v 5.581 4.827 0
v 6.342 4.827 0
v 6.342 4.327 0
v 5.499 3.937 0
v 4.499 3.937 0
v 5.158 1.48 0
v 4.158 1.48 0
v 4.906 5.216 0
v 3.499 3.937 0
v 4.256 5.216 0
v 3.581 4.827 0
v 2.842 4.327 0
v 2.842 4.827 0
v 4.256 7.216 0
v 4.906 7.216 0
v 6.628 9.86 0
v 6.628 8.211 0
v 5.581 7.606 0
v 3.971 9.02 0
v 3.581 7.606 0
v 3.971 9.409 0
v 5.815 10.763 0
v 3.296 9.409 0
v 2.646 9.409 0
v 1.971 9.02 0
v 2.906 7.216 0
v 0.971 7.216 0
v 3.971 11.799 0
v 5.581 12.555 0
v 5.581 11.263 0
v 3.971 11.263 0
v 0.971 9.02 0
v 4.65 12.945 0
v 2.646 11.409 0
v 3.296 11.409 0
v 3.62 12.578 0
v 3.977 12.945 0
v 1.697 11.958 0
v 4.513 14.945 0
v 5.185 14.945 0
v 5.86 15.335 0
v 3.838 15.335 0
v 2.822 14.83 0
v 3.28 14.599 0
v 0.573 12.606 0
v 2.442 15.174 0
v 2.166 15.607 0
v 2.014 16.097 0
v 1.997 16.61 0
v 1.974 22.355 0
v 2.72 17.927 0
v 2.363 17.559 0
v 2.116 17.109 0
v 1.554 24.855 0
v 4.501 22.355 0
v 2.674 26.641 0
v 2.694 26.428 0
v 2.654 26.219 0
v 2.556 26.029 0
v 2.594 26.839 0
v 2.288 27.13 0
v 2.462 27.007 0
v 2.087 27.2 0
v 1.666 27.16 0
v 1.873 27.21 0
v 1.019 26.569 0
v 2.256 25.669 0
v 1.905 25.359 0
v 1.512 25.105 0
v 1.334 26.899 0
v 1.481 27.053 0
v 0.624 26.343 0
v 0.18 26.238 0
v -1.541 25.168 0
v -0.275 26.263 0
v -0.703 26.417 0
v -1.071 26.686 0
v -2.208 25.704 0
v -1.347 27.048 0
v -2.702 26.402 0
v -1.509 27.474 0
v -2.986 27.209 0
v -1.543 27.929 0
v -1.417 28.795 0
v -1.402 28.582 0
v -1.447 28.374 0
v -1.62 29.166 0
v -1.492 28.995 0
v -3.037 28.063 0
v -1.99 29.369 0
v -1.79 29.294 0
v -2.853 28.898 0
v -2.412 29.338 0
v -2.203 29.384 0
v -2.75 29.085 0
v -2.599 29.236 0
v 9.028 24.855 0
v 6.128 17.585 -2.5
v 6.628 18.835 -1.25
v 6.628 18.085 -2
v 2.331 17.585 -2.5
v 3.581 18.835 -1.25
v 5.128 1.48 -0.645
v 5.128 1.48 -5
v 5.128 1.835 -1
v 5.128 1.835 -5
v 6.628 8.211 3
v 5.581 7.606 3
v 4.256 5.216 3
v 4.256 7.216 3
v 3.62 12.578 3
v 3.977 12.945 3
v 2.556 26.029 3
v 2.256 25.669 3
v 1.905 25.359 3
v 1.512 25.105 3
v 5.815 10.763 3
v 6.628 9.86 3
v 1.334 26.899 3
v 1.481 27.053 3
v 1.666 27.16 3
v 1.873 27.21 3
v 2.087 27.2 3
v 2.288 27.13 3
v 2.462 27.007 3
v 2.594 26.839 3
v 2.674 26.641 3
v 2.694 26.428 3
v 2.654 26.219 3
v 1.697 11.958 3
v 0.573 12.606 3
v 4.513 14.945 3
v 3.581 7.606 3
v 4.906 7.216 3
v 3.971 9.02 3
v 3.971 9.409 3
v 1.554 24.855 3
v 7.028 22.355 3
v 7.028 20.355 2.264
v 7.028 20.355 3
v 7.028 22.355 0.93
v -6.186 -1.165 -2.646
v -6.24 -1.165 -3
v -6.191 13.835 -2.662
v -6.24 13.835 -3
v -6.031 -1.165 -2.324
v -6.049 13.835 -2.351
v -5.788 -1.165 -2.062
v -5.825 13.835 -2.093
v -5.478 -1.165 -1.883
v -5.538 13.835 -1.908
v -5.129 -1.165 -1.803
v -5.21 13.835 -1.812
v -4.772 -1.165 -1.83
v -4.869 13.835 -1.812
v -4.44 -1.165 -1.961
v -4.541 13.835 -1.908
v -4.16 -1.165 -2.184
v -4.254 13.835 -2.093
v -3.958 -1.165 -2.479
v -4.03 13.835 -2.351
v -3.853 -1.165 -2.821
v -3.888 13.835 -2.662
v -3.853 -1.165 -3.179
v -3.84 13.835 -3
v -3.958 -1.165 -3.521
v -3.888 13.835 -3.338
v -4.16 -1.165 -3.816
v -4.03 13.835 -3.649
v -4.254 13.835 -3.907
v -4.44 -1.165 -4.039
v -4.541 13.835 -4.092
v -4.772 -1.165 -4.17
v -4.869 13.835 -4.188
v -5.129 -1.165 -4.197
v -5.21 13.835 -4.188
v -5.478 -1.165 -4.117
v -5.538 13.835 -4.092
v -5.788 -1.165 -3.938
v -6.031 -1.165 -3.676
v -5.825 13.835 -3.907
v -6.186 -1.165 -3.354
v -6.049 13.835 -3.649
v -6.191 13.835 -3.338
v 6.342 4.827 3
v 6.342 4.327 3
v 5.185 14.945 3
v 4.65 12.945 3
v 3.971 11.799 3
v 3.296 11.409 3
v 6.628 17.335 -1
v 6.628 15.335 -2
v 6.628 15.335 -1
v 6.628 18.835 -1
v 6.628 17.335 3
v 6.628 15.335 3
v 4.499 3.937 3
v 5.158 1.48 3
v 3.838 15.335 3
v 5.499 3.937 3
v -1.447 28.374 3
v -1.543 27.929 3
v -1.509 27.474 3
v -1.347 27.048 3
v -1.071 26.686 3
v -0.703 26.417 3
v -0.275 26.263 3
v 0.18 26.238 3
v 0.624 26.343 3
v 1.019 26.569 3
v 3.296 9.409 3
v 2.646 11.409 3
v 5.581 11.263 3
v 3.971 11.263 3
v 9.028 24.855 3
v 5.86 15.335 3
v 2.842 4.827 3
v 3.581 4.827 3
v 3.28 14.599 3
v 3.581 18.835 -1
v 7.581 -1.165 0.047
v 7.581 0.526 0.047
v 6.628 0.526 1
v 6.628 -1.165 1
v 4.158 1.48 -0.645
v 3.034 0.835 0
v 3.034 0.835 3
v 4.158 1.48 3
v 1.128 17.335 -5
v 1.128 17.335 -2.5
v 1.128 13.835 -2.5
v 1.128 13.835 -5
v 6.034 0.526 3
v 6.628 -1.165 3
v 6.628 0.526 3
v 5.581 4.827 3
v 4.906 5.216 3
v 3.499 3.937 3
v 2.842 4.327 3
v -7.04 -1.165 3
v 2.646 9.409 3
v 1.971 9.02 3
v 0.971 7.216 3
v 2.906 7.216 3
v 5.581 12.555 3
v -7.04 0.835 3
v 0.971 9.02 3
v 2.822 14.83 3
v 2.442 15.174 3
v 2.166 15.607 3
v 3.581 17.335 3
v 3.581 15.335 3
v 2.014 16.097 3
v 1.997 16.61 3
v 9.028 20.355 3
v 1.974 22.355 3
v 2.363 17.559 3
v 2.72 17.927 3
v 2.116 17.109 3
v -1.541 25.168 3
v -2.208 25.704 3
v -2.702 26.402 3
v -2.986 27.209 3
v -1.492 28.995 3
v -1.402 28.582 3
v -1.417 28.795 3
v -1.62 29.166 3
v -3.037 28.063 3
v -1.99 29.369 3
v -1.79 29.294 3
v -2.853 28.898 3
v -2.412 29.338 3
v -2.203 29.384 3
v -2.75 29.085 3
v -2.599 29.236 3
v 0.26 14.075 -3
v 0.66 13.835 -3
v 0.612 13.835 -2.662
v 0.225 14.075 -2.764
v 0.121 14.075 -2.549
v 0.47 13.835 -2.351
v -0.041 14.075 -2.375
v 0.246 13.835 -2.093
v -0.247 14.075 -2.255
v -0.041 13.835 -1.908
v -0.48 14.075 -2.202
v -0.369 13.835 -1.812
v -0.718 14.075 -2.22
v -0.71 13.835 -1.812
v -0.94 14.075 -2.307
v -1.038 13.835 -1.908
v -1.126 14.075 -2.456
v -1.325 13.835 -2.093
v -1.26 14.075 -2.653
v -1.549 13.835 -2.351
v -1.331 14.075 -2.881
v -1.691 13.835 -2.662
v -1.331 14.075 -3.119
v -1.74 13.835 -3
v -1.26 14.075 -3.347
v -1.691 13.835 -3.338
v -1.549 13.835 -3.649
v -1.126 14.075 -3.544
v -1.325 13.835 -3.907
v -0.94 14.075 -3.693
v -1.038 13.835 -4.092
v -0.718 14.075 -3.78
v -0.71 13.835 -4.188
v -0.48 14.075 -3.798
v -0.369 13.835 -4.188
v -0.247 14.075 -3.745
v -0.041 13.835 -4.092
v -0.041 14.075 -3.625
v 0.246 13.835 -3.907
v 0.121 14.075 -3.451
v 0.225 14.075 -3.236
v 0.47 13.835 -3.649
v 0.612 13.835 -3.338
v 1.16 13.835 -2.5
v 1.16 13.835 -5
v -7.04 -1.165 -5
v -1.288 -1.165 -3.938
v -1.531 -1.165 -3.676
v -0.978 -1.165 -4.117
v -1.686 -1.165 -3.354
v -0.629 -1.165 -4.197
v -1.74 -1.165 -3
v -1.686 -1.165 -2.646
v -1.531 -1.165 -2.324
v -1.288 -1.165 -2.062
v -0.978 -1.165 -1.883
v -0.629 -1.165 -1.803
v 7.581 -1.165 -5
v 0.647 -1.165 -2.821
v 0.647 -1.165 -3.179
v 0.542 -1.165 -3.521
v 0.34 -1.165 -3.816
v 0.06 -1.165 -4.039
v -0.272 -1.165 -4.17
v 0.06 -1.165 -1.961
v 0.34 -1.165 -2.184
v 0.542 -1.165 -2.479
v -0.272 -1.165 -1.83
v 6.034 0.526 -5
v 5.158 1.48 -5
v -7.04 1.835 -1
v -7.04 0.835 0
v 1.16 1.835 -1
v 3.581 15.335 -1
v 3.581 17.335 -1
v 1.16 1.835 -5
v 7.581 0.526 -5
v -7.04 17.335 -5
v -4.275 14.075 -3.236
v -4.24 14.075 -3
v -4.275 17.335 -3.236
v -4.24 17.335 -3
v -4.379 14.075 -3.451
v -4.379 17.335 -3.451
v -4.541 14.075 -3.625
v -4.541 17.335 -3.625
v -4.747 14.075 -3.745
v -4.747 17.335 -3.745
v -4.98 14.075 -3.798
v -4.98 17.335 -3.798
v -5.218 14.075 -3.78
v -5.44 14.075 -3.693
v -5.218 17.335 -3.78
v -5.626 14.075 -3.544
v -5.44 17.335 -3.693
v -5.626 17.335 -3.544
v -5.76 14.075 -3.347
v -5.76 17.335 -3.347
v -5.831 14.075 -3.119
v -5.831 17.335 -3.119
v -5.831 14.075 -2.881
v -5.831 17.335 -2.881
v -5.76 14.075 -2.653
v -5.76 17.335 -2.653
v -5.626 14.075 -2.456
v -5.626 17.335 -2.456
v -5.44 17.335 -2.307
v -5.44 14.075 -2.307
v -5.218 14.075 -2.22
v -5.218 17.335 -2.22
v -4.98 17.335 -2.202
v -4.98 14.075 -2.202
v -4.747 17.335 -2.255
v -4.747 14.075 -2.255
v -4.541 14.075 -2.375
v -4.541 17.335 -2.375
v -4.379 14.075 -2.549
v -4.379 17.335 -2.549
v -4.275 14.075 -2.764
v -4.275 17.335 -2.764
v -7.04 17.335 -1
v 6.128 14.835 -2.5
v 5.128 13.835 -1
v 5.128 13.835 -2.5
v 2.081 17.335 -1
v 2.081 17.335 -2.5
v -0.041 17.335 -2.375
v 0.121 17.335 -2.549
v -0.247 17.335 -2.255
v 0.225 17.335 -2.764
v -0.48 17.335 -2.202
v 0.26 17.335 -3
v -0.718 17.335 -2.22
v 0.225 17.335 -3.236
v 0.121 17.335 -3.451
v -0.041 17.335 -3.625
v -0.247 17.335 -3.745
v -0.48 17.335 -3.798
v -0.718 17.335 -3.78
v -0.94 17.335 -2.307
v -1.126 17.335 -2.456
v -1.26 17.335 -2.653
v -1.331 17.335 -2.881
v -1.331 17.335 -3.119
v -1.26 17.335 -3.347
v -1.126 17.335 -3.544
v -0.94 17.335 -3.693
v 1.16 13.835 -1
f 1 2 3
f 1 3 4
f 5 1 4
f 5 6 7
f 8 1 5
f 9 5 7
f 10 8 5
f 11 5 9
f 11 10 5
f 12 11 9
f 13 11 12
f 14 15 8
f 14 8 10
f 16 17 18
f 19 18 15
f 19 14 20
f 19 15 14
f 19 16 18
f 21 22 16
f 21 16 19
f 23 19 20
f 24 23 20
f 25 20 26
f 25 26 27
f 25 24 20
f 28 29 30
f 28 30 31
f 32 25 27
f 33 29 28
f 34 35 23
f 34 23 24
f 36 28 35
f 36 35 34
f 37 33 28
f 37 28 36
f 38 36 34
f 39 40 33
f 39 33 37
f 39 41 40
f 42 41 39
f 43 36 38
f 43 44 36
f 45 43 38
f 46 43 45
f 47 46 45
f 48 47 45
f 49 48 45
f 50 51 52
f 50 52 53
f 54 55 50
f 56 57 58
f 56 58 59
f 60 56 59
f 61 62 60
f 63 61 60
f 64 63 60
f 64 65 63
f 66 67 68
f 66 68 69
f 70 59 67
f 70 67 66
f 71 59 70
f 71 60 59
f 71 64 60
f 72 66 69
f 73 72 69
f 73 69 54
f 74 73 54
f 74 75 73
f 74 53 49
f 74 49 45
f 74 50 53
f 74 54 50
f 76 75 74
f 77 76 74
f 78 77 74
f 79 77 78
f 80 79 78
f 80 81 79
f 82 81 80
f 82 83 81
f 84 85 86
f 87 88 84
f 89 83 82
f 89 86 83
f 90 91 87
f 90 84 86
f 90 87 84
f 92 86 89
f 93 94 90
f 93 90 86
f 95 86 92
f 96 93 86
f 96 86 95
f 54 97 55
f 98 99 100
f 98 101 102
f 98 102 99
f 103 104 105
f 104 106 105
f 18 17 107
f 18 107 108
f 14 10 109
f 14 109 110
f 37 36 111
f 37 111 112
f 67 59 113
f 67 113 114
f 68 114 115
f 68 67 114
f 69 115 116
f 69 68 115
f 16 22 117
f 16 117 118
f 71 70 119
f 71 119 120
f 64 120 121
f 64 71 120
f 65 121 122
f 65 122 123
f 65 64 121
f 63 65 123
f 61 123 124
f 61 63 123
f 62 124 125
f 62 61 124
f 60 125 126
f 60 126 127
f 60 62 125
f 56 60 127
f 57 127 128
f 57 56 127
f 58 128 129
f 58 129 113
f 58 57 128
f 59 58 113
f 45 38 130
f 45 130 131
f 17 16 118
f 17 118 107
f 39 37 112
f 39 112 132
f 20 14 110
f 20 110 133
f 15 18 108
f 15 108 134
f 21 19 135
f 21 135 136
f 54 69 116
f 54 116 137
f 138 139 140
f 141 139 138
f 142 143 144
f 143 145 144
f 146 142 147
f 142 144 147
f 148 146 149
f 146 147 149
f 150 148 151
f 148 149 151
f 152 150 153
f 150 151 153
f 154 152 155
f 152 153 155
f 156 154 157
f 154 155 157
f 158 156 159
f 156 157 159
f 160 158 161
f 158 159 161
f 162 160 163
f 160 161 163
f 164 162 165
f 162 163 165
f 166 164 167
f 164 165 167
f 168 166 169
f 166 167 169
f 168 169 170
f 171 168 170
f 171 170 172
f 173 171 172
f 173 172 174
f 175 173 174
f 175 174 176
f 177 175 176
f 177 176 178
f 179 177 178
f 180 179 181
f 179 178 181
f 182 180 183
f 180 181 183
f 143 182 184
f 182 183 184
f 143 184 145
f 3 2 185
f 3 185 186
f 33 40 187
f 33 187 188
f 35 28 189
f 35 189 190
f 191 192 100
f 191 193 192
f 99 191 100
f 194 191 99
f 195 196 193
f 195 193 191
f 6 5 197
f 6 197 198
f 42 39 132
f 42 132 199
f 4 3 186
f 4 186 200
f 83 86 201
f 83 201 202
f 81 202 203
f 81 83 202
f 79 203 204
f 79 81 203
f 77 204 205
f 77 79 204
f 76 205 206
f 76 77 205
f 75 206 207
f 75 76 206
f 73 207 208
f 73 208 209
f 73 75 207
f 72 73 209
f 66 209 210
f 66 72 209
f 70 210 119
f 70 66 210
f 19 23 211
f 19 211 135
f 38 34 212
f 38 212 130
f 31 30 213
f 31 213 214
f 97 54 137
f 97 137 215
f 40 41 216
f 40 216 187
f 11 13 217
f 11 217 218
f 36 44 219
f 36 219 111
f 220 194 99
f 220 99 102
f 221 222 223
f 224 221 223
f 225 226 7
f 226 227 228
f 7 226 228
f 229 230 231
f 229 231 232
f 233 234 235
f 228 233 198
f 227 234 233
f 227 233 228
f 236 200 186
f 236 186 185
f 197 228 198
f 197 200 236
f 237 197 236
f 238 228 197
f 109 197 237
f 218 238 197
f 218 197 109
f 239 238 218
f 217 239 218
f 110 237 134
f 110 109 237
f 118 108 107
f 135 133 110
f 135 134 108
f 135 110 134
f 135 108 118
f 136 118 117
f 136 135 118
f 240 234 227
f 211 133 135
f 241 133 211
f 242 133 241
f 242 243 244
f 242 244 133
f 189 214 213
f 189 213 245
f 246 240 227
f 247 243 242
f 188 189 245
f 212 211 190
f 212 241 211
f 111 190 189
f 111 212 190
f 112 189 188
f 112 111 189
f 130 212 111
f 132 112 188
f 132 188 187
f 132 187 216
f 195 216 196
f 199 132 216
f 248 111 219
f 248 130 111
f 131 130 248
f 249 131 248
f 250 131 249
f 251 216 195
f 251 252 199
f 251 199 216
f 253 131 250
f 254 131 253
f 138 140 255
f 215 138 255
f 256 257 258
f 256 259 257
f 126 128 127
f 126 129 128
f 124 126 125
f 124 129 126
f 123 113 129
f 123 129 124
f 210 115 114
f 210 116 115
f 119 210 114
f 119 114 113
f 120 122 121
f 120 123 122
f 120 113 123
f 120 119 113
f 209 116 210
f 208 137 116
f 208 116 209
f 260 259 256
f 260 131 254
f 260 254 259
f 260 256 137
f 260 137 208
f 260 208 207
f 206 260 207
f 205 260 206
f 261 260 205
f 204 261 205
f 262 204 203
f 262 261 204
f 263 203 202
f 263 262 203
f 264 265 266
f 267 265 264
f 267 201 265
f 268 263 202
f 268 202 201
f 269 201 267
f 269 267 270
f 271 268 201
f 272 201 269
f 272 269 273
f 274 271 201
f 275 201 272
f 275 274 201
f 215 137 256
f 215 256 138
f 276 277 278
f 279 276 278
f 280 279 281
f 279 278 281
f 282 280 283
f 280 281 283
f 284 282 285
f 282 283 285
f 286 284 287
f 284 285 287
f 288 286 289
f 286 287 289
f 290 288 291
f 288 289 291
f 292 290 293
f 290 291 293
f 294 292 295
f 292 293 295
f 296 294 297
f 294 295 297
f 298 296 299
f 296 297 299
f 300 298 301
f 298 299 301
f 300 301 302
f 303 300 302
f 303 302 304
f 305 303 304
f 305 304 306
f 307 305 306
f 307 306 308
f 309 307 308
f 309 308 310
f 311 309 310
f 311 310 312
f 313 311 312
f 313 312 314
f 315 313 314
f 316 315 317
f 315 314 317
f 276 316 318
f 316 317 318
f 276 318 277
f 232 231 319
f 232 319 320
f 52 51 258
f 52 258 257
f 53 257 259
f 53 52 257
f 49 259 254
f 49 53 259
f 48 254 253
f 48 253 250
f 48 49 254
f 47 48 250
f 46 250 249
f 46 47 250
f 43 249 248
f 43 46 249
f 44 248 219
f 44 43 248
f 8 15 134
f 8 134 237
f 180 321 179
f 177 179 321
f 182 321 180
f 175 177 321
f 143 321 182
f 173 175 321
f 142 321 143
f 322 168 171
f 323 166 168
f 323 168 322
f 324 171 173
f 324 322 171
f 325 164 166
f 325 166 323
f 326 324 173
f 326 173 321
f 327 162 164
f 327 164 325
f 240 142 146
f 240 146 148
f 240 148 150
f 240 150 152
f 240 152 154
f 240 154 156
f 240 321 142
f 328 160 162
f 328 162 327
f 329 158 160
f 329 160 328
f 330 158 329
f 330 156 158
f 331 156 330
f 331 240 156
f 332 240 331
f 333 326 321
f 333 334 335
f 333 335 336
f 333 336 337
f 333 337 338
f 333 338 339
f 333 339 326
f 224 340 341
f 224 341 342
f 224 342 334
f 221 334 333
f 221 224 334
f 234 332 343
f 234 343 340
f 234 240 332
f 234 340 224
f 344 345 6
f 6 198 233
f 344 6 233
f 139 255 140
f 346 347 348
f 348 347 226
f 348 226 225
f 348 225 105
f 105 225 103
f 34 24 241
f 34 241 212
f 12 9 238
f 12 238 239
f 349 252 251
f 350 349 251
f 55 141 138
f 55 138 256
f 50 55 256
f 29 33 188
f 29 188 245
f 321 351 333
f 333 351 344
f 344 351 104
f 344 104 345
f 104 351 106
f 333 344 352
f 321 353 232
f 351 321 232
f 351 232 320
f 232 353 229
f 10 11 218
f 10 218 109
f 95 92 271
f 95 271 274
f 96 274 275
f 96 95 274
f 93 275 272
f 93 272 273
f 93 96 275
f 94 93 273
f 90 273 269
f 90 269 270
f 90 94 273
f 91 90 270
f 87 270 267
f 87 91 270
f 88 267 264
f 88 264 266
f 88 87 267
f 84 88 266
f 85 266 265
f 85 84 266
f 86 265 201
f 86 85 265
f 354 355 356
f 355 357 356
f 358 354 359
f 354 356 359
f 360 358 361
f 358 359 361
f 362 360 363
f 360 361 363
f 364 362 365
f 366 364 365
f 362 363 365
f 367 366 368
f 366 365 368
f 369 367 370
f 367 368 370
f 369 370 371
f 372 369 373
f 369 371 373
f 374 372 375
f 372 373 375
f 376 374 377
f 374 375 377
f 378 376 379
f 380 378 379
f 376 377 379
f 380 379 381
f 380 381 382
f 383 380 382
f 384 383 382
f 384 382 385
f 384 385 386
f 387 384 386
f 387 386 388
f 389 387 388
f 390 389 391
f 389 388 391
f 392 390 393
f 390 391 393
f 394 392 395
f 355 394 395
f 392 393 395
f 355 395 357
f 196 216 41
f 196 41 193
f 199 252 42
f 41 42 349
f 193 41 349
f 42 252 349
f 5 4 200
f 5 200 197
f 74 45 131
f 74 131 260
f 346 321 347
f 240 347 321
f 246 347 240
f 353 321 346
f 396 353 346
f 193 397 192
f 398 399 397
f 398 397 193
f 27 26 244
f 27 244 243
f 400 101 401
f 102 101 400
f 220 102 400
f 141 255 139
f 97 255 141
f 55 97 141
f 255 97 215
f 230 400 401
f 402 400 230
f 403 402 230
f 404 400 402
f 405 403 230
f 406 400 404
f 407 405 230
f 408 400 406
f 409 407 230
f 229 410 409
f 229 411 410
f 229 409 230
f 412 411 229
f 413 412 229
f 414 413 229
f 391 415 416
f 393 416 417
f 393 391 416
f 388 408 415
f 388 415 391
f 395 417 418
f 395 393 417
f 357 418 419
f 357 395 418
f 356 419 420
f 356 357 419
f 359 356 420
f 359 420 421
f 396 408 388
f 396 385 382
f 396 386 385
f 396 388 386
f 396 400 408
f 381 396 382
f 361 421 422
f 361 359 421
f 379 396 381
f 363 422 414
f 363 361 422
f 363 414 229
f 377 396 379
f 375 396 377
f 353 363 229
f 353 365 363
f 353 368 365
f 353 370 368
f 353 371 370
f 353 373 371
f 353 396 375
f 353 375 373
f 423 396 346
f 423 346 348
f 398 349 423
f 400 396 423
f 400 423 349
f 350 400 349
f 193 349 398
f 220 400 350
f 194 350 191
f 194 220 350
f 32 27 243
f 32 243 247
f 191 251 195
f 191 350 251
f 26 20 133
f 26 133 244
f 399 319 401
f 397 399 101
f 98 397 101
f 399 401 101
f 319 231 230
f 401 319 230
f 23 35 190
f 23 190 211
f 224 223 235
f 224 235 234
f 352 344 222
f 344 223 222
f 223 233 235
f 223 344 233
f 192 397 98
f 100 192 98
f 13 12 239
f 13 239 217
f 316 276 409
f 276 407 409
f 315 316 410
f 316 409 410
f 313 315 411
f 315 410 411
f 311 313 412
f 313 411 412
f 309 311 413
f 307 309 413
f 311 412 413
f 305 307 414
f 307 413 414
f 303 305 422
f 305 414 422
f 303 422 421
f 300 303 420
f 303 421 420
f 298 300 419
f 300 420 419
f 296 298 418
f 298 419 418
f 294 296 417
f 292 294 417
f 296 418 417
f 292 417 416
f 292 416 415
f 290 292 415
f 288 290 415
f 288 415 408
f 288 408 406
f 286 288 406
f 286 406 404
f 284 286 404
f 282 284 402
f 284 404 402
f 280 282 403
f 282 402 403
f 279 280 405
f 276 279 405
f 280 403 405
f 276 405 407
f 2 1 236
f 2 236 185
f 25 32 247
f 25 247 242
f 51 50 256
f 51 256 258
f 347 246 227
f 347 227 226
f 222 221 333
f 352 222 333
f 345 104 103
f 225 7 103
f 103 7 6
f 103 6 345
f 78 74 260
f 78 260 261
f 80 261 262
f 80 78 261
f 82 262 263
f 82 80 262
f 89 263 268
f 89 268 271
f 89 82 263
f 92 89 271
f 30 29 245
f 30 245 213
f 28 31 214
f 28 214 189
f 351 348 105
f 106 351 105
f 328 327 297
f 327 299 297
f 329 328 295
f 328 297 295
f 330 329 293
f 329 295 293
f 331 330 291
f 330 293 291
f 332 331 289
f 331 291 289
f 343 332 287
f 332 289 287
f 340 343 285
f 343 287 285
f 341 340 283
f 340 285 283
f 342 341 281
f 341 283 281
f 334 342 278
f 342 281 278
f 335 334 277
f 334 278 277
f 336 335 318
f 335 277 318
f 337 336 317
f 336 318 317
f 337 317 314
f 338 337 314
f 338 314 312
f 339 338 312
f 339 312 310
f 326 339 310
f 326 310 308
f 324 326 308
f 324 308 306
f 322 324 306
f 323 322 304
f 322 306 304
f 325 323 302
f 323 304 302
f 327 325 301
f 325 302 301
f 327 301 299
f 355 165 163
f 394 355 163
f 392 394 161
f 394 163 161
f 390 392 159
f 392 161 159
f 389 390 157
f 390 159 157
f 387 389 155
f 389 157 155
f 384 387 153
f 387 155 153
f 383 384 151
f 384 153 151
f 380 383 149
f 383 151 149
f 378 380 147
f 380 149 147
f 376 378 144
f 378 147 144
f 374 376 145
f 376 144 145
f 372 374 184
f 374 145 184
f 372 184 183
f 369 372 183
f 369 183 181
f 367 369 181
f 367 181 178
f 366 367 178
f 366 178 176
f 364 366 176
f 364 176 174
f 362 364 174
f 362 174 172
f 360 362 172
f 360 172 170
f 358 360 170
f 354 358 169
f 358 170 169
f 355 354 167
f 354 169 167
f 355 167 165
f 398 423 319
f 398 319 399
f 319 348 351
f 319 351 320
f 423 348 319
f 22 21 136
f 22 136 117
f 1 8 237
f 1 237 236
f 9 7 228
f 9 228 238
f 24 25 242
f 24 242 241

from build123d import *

# Parameters (mm, degrees)
BOSS_SWITCH_BODY_DEPTH                    = 3
SKETCH1_W                                 = 4
SKETCH1_H                                 = 3.5
BOSS_FLANGE_WIDTH_DEPTH                   = 5
BOSS_FLANGE_HEIGHT_REACH                  = 35.863
SKETCH2_W                                 = 4
SKETCH2_H                                 = 2
SKETCH2_W_2                               = 8
CUT_UP_TO_DOWN_DERAILLEUR_CLEARANCE_REACH = 21.462
SKETCH10_W                                = 2.453096586
SKETCH10_H                                = 3
SKETCH17_W                                = 12.1675
SKETCH17_H                                = 4
BOSS_FLANGE_SUPPORT_DEPTH                 = 14.499999955
TAP_DRILL_FOR_M2X0_4_TAP1_D               = 1.6
M2_CLEARANCE_HOLE2_D                      = 2.4
M2_CLEARANCE_HOLE2_DEPTH                  = 15
M2_CLEARANCE_HOLE2_TIP                    = 0.721032743
CHAMFER_FLANGE_SUPPORT_SIZE               = 1.5
CHAMFER_FLANGE_SUPPORT_2_SIZE             = 1.5
CHAMFER_FLANGE_SUPPORT_3_SIZE             = 1
SKETCH23_W                                = 3.9675
SKETCH23_H                                = 11.999999954
CUT_GAP_FOR_PRINTING_DEPTH                = 32.000499688
SKETCH25_W                                = 0.953096586
SKETCH25_H                                = 3.5
CUT_DERAILLEUR_CLEARANCE_DEPTH            = 32.145320369
CHAMFER8_SIZE                             = 1
CUT_UP_TO_DOWN_CANTILEVER_SLOPE_REACH     = 31.869
SKETCH26_W                                = 12.477246204
SKETCH26_H                                = 5.771077126
CUT_WIDE_DERAILLEUR_CLEARANCE_DEPTH       = 33.195879702
CUT_WIDE_DERAILLEUR_CLEARANCE_DEPTH_BACK  = 4
SKETCH27_W                                = 2.5
SKETCH27_H                                = 5.000000046
CHAMFER9_SIZE                             = 1.25
SKETCH28_W                                = 3.046903414
SKETCH28_H                                = 1.5
CUT_EXTRUDE1_DEPTH                        = 1


# Some blends are built 0.0001 mm under size
with BuildPart() as part:
    # Sketch-SwitchBossUp → Boss-Switch Body (new body)
    with BuildSketch(Plane.XY):
        with BuildLine():
            Line((5.581091201, 12.55524379), (5.581100766, 11.263016279))
            Line((5.581100766, 11.263016279), (3.971265023, 11.263016279))
            Line((3.971265023, 11.263016279), (3.97126394, 11.79911022))
            Line((3.97126394, 11.79911022), (3.296271341, 11.409403061))
            Line((3.296271341, 11.409403061), (3.296271341, 9.409403061))
            Line((3.296271341, 9.409403061), (3.971278743, 9.019687356))
            Line((3.971278743, 9.019687356), (3.971278743, 9.409408058))
            Line((3.971278743, 9.409408058), (5.815189336, 10.763016279))
            Line((5.815189336, 10.763016279), (6.627976927, 9.860324207))
            Line((6.627976927, 9.860324207), (6.627976927, 8.210536506))
            Line((6.627976927, 8.210536506), (5.581127833, 7.606137899))
            Line((5.581127833, 7.606137899), (4.906138119, 7.216432406))
            Line((4.906138119, 7.216432406), (4.906138119, 5.216432406))
            Line((4.906138119, 5.216432406), (5.58114552, 4.826716701))
            Line((5.58114552, 4.826716701), (6.342350466, 4.826716701))
            Line((6.342350466, 4.826716701), (6.342350466, 4.326716701))
            Line((6.342350466, 4.326716701), (5.499190584, 3.937018274))
            Line((5.499190584, 3.937018274), (4.499190584, 3.937018274))
            Line((4.499190584, 3.937018274), (5.157616583, 1.479738993))
            Line((5.157616583, 1.479738993), (6.034464198, 0.526482161))
            Line((6.034464198, 0.526482161), (6.627976927, 0.526482161))
            Line((6.627976927, 0.526482161), (6.627976927, -1.165310653))
            Line((6.627976927, -1.165310653), (3.034464198, -1.165310653))
            Line((3.034464198, -1.165310653), (3.034464198, 0.834689347))
            Line((3.034464198, 0.834689347), (4.157616583, 1.479738993))
            Line((4.157616583, 1.479738993), (3.499190584, 3.937018274))
            Line((3.499190584, 3.937018274), (2.842350466, 4.326720436))
            Line((2.842350466, 4.326720436), (2.842350466, 4.826720436))
            Line((2.842350466, 4.826720436), (3.58114552, 4.826720436))
            Line((3.58114552, 4.826720436), (4.256138119, 5.216427595))
            Line((4.256138119, 5.216427595), (4.256138119, 7.216427595))
            Line((4.256138119, 7.216427595), (3.581130717, 7.6061433))
            Line((3.581130717, 7.6061433), (2.9061262, 7.216422599))
            Line((2.9061262, 7.216422599), (0.971281627, 7.216422599))
            Line((0.971281627, 7.216422599), (0.971281627, 9.019692757))
            Line((0.971281627, 9.019692757), (1.971281627, 9.019692757))
            Line((1.971281627, 9.019692757), (2.646271341, 9.40939825))
            Line((2.646271341, 9.40939825), (2.646271341, 11.40939825))
            Line((2.646271341, 11.40939825), (1.696557212, 11.957715958))
            Line((1.696557212, 11.957715958), (0.573317845, 12.60621851))
            Line((0.573317845, 12.60621851), (-1.541303694, 25.167805745))
            ThreePointArc((-1.541303694, 25.167805745), (-2.872284003, 26.795385437), (-2.852546321, 28.897797067))
            ThreePointArc((-2.852546321, 28.897797067), (-1.887813913, 29.338582026), (-1.447028953, 28.373849618))
            ThreePointArc((-1.447028953, 28.373849618), (-0.703448682, 26.416936722), (1.333779254, 26.898727173))
            ThreePointArc((1.333779254, 26.898727173), (2.379722745, 27.074801628), (2.555797201, 26.028858137))
            ThreePointArc((2.555797201, 26.028858137), (2.086504637, 25.507104397), (1.511513111, 25.104801997))
            Line((1.511513111, 25.104801997), (1.553598189, 24.854801997))
            Line((1.553598189, 24.854801997), (9.027976927, 24.854801997))
            Line((9.027976927, 24.854801997), (9.027976927, 22.354801997))
            Line((9.027976927, 22.354801997), (9.027976927, 20.354801997))
            Line((9.027976927, 20.354801997), (7.027976927, 20.354801997))
            Line((7.027976927, 20.354801997), (7.027976927, 22.354801997))
            Line((7.027976927, 22.354801997), (1.974448974, 22.354801997))
            Line((1.974448974, 22.354801997), (2.719778232, 17.927287042))
            ThreePointArc((2.719778232, 17.927287042), (2.013826204, 16.096957693), (3.280124137, 14.598637521))
            Line((3.280124137, 14.598637521), (3.620297651, 12.577888564))
            Line((3.620297651, 12.577888564), (3.976674365, 12.944956135))
            Line((3.976674365, 12.944956135), (4.512557947, 14.944960101))
            Line((4.512557947, 14.944960101), (3.837515632, 15.334689301))
            Line((3.837515632, 15.334689301), (3.581073513, 15.334689301))
            Line((3.581073513, 15.334689301), (3.581073513, 17.334689301))
            Line((3.581073513, 17.334689301), (5.725580434, 17.334689301))
            Line((5.725580434, 17.334689301), (6.627976927, 17.334689301))
            Line((6.627976927, 17.334689301), (6.627976927, 15.334689301))
            Line((6.627976927, 15.334689301), (5.860498075, 15.334689301))
            Line((5.860498075, 15.334689301), (5.185487464, 14.944965082))
            Line((5.185487464, 14.944965082), (4.649603883, 12.944961115))
            Line((4.649603883, 12.944961115), (5.581091201, 12.55524379))
        make_face()
    extrude(amount=BOSS_SWITCH_BODY_DEPTH)

    # Sketch1 → Boss-Flange Width (add)
    with BuildSketch(Plane(origin=(0, 0, 0), x_dir=(-1, 0, 0), z_dir=(0, 0, -1))):
        Polygon((-7.581073513, -1.165310653), (0.412170615, -1.165310653), (0.412170615, 0.834689347), (-3.034464198, 0.834689347), (-4.157616583, 1.479738993), (-5.157616583, 1.479738993), (-6.034464198, 0.526482161), (-7.581073513, 0.526482161), align=None)
        with Locations((-5.581073513, 17.084689301)):
            Rectangle(SKETCH1_W, SKETCH1_H)
    extrude(amount=BOSS_FLANGE_WIDTH_DEPTH)

    # Sketch2 → Boss-Flange Height (add, up to next)
    with BuildSketch(Plane(origin=(-7.039523073, 0, 0), x_dir=(0, 0, -1), z_dir=(1, 0, 0)), mode=Mode.PRIVATE) as boss_flange_height_sk1:
        with Locations((3, 16.334689301)):
            Rectangle(SKETCH2_W, SKETCH2_H)
    boss_flange_height_tool1 = extrude(boss_flange_height_sk1.sketch, amount=BOSS_FLANGE_HEIGHT_REACH, mode=Mode.PRIVATE) - part.part
    # Sketch2 → Boss-Flange Height (add, up to next)
    with BuildSketch(Plane(origin=(-7.039523073, 0, 0), x_dir=(0, 0, -1), z_dir=(1, 0, 0)), mode=Mode.PRIVATE) as boss_flange_height_sk2:
        with Locations((1, -0.165310653)):
            Rectangle(SKETCH2_W_2, SKETCH2_H)
    boss_flange_height_tool2 = extrude(boss_flange_height_sk2.sketch, amount=BOSS_FLANGE_HEIGHT_REACH, mode=Mode.PRIVATE) - part.part
    add(boss_flange_height_tool1.solids().sort_by_distance((-7.039523, 16.334689, -3))[0])
    add(boss_flange_height_tool2.solids().sort_by_distance((-7.039523, -0.165311, -1))[0])

    # Sketch10 → Cut-Up-To-Down Derailleur Clearance (cut, up to next)
    with BuildSketch(Plane(origin=(0, 15.334689301, 0), x_dir=(1, 0, 0), z_dir=(0, 1, 0)), mode=Mode.PRIVATE) as cut_up_to_down_derailleur_clearance_sk1:
        with Locations((6.35452522, 3.5)):
            Rectangle(SKETCH10_W, SKETCH10_H)
    cut_up_to_down_derailleur_clearance_tool1 = extrude(cut_up_to_down_derailleur_clearance_sk1.sketch, amount=CUT_UP_TO_DOWN_DERAILLEUR_CLEARANCE_REACH, mode=Mode.PRIVATE) & part.part
    add(cut_up_to_down_derailleur_clearance_tool1.solids().sort_by_distance((6.354525, 15.334689, -3.5))[0], mode=Mode.SUBTRACT)

    # Sketch17 → Boss-Flange Support (add)
    with BuildSketch(Plane.XZ.offset(-15.334689301)):
        with Locations((-0.955773073, -3)):
            Rectangle(SKETCH17_W, SKETCH17_H)
    extrude(amount=BOSS_FLANGE_SUPPORT_DEPTH)

    # Tap Drill for M2x0.4 Tap1 (through all)
    with Locations(Plane(origin=(0, -1.165310653, 0), x_dir=(-1, 0, 0), z_dir=(0, -1, 0))):
        with Locations((5.039523073, 3), (0.539523073, 3)):
            Hole(TAP_DRILL_FOR_M2X0_4_TAP1_D / 2)

    # M2 Clearance Hole2
    with Locations(Plane.XZ.offset(1.165310653)):
        with Locations((-5.039523073, -3), (-0.539523073, -3)):
            Hole(M2_CLEARANCE_HOLE2_D / 2, depth=M2_CLEARANCE_HOLE2_DEPTH)
            with Locations((0, 0, -(M2_CLEARANCE_HOLE2_DEPTH + M2_CLEARANCE_HOLE2_TIP / 2))):  # 118° drill point
                Cone(0, M2_CLEARANCE_HOLE2_D / 2, M2_CLEARANCE_HOLE2_TIP, mode=Mode.SUBTRACT)

    # Chamfer-Flange Support
    chamfer_flange_support_edges = [part.edges().sort_by_distance(p)[0] for p in [
        (3.581073513, 17.334689301, -3),
    ]]
    chamfer(chamfer_flange_support_edges, length=CHAMFER_FLANGE_SUPPORT_SIZE - 0.0001)  # a hair under: the kernel refuses the full size

    # Chamfer-Flange Support 2
    chamfer_flange_support_2_edges = [part.edges().sort_by_distance(p)[0] for p in [
        (5.127976927, 17.084689301, -2),
        (5.127976927, 15.334689301, -1.5),
    ]]
    chamfer(chamfer_flange_support_2_edges, length=CHAMFER_FLANGE_SUPPORT_2_SIZE)

    # Chamfer-Flange Support 3
    chamfer_flange_support_3_edges = [part.edges().sort_by_distance(p)[0] for p in [
        (-2.002529437, 0.834689346, -1),
    ]]
    chamfer(chamfer_flange_support_3_edges, length=CHAMFER_FLANGE_SUPPORT_3_SIZE)

    # Sketch23 → Cut-Gap for Printing (cut, through all)
    with BuildSketch(Plane.XY.offset(-1)):
        with Locations((3.144226927, 7.834689324)):
            Rectangle(SKETCH23_W, SKETCH23_H)
    extrude(amount=-CUT_GAP_FOR_PRINTING_DEPTH, mode=Mode.SUBTRACT)

    # Sketch25 → Cut-Derailleur Clearance (cut, through all)
    with BuildSketch(Plane.XY):
        with Locations((7.10452522, 17.084689301)):
            Rectangle(SKETCH25_W, SKETCH25_H)
    extrude(amount=-CUT_DERAILLEUR_CLEARANCE_DEPTH, mode=Mode.SUBTRACT)

    # Chamfer8
    # the kernel refuses this chamfer: 1 mm, written as the material it adds along each edge
    with BuildSketch(Plane(origin=(6.627976927, 0.526482161, 0), x_dir=(0.9996219169112968, -3.148763632499715e-15, -0.027495876610586365), z_dir=(0, -1, 0))) as chamfer8_piece_1_section:
        Polygon((CHAMFER8_SIZE * 0.999621916911, CHAMFER8_SIZE * 0.0274958766106), (-CHAMFER8_SIZE * 0.0274958766106, CHAMFER8_SIZE * 0.999621916911), (0, 0), align=None)
    chamfer8_piece_1 = extrude(amount=1.691792814, mode=Mode.PRIVATE)
    chamfer8_piece_1 = split(chamfer8_piece_1, bisect_by=Plane(origin=(7.581073513, -0.319414246, 0.332375145), z_dir=(-1, 0, 0)), keep=Keep.TOP, mode=Mode.PRIVATE)
    add(chamfer8_piece_1)

    # Sketch26 → Cut-Up-to-Down Cantilever Slope (cut, up to next)
    with BuildSketch(Plane(origin=(-3.086642121, 5.589000146, 8.383500218), x_dir=(-0.9561404375276108, -0.1624764728289173, -0.24371470924337582), z_dir=(0.2929086269205964, -0.5303712883154423, -0.795556932473163)), mode=Mode.PRIVATE) as cut_up_to_down_cantilever_slope_sk1:
        with Locations((-13.791615152, 17.794906754)):
            Rectangle(SKETCH26_W, SKETCH26_H)
    cut_up_to_down_cantilever_slope_tool1 = extrude(cut_up_to_down_cantilever_slope_sk1.sketch, amount=CUT_UP_TO_DOWN_CANTILEVER_SLOPE_REACH, mode=Mode.PRIVATE) & part.part
    add(cut_up_to_down_cantilever_slope_tool1.solids().sort_by_distance((10.100079, 22.636071, 1.873881))[0], mode=Mode.SUBTRACT)

    # Sketch27 → Cut-Wide Derailleur Clearance (cut, two sides: drawn at the far end of the back side and taken through both)
    with BuildSketch(Plane(origin=(5.127976927, 0, 0), x_dir=(0, 0, -1), z_dir=(1, 0, 0)).offset(-CUT_WIDE_DERAILLEUR_CLEARANCE_DEPTH_BACK)):
        with Locations((3.75, 16.334689324)):
            Rectangle(SKETCH27_W, SKETCH27_H)
    extrude(amount=CUT_WIDE_DERAILLEUR_CLEARANCE_DEPTH + CUT_WIDE_DERAILLEUR_CLEARANCE_DEPTH_BACK, mode=Mode.SUBTRACT)

    # Chamfer9
    chamfer9_edges = [part.edges().sort_by_distance(p)[0] for p in [
        (4.85452522, 18.834689347, -2.5),
    ]]
    chamfer(chamfer9_edges, length=CHAMFER9_SIZE)

    # Sketch28 → Cut-Extrude1 (cut)
    with BuildSketch(Plane.XY.offset(-1)):
        with Locations((5.10452522, 18.084689301)):
            Rectangle(SKETCH28_W, SKETCH28_H)
    extrude(amount=CUT_EXTRUDE1_DEPTH, mode=Mode.SUBTRACT)


solid = part.part
